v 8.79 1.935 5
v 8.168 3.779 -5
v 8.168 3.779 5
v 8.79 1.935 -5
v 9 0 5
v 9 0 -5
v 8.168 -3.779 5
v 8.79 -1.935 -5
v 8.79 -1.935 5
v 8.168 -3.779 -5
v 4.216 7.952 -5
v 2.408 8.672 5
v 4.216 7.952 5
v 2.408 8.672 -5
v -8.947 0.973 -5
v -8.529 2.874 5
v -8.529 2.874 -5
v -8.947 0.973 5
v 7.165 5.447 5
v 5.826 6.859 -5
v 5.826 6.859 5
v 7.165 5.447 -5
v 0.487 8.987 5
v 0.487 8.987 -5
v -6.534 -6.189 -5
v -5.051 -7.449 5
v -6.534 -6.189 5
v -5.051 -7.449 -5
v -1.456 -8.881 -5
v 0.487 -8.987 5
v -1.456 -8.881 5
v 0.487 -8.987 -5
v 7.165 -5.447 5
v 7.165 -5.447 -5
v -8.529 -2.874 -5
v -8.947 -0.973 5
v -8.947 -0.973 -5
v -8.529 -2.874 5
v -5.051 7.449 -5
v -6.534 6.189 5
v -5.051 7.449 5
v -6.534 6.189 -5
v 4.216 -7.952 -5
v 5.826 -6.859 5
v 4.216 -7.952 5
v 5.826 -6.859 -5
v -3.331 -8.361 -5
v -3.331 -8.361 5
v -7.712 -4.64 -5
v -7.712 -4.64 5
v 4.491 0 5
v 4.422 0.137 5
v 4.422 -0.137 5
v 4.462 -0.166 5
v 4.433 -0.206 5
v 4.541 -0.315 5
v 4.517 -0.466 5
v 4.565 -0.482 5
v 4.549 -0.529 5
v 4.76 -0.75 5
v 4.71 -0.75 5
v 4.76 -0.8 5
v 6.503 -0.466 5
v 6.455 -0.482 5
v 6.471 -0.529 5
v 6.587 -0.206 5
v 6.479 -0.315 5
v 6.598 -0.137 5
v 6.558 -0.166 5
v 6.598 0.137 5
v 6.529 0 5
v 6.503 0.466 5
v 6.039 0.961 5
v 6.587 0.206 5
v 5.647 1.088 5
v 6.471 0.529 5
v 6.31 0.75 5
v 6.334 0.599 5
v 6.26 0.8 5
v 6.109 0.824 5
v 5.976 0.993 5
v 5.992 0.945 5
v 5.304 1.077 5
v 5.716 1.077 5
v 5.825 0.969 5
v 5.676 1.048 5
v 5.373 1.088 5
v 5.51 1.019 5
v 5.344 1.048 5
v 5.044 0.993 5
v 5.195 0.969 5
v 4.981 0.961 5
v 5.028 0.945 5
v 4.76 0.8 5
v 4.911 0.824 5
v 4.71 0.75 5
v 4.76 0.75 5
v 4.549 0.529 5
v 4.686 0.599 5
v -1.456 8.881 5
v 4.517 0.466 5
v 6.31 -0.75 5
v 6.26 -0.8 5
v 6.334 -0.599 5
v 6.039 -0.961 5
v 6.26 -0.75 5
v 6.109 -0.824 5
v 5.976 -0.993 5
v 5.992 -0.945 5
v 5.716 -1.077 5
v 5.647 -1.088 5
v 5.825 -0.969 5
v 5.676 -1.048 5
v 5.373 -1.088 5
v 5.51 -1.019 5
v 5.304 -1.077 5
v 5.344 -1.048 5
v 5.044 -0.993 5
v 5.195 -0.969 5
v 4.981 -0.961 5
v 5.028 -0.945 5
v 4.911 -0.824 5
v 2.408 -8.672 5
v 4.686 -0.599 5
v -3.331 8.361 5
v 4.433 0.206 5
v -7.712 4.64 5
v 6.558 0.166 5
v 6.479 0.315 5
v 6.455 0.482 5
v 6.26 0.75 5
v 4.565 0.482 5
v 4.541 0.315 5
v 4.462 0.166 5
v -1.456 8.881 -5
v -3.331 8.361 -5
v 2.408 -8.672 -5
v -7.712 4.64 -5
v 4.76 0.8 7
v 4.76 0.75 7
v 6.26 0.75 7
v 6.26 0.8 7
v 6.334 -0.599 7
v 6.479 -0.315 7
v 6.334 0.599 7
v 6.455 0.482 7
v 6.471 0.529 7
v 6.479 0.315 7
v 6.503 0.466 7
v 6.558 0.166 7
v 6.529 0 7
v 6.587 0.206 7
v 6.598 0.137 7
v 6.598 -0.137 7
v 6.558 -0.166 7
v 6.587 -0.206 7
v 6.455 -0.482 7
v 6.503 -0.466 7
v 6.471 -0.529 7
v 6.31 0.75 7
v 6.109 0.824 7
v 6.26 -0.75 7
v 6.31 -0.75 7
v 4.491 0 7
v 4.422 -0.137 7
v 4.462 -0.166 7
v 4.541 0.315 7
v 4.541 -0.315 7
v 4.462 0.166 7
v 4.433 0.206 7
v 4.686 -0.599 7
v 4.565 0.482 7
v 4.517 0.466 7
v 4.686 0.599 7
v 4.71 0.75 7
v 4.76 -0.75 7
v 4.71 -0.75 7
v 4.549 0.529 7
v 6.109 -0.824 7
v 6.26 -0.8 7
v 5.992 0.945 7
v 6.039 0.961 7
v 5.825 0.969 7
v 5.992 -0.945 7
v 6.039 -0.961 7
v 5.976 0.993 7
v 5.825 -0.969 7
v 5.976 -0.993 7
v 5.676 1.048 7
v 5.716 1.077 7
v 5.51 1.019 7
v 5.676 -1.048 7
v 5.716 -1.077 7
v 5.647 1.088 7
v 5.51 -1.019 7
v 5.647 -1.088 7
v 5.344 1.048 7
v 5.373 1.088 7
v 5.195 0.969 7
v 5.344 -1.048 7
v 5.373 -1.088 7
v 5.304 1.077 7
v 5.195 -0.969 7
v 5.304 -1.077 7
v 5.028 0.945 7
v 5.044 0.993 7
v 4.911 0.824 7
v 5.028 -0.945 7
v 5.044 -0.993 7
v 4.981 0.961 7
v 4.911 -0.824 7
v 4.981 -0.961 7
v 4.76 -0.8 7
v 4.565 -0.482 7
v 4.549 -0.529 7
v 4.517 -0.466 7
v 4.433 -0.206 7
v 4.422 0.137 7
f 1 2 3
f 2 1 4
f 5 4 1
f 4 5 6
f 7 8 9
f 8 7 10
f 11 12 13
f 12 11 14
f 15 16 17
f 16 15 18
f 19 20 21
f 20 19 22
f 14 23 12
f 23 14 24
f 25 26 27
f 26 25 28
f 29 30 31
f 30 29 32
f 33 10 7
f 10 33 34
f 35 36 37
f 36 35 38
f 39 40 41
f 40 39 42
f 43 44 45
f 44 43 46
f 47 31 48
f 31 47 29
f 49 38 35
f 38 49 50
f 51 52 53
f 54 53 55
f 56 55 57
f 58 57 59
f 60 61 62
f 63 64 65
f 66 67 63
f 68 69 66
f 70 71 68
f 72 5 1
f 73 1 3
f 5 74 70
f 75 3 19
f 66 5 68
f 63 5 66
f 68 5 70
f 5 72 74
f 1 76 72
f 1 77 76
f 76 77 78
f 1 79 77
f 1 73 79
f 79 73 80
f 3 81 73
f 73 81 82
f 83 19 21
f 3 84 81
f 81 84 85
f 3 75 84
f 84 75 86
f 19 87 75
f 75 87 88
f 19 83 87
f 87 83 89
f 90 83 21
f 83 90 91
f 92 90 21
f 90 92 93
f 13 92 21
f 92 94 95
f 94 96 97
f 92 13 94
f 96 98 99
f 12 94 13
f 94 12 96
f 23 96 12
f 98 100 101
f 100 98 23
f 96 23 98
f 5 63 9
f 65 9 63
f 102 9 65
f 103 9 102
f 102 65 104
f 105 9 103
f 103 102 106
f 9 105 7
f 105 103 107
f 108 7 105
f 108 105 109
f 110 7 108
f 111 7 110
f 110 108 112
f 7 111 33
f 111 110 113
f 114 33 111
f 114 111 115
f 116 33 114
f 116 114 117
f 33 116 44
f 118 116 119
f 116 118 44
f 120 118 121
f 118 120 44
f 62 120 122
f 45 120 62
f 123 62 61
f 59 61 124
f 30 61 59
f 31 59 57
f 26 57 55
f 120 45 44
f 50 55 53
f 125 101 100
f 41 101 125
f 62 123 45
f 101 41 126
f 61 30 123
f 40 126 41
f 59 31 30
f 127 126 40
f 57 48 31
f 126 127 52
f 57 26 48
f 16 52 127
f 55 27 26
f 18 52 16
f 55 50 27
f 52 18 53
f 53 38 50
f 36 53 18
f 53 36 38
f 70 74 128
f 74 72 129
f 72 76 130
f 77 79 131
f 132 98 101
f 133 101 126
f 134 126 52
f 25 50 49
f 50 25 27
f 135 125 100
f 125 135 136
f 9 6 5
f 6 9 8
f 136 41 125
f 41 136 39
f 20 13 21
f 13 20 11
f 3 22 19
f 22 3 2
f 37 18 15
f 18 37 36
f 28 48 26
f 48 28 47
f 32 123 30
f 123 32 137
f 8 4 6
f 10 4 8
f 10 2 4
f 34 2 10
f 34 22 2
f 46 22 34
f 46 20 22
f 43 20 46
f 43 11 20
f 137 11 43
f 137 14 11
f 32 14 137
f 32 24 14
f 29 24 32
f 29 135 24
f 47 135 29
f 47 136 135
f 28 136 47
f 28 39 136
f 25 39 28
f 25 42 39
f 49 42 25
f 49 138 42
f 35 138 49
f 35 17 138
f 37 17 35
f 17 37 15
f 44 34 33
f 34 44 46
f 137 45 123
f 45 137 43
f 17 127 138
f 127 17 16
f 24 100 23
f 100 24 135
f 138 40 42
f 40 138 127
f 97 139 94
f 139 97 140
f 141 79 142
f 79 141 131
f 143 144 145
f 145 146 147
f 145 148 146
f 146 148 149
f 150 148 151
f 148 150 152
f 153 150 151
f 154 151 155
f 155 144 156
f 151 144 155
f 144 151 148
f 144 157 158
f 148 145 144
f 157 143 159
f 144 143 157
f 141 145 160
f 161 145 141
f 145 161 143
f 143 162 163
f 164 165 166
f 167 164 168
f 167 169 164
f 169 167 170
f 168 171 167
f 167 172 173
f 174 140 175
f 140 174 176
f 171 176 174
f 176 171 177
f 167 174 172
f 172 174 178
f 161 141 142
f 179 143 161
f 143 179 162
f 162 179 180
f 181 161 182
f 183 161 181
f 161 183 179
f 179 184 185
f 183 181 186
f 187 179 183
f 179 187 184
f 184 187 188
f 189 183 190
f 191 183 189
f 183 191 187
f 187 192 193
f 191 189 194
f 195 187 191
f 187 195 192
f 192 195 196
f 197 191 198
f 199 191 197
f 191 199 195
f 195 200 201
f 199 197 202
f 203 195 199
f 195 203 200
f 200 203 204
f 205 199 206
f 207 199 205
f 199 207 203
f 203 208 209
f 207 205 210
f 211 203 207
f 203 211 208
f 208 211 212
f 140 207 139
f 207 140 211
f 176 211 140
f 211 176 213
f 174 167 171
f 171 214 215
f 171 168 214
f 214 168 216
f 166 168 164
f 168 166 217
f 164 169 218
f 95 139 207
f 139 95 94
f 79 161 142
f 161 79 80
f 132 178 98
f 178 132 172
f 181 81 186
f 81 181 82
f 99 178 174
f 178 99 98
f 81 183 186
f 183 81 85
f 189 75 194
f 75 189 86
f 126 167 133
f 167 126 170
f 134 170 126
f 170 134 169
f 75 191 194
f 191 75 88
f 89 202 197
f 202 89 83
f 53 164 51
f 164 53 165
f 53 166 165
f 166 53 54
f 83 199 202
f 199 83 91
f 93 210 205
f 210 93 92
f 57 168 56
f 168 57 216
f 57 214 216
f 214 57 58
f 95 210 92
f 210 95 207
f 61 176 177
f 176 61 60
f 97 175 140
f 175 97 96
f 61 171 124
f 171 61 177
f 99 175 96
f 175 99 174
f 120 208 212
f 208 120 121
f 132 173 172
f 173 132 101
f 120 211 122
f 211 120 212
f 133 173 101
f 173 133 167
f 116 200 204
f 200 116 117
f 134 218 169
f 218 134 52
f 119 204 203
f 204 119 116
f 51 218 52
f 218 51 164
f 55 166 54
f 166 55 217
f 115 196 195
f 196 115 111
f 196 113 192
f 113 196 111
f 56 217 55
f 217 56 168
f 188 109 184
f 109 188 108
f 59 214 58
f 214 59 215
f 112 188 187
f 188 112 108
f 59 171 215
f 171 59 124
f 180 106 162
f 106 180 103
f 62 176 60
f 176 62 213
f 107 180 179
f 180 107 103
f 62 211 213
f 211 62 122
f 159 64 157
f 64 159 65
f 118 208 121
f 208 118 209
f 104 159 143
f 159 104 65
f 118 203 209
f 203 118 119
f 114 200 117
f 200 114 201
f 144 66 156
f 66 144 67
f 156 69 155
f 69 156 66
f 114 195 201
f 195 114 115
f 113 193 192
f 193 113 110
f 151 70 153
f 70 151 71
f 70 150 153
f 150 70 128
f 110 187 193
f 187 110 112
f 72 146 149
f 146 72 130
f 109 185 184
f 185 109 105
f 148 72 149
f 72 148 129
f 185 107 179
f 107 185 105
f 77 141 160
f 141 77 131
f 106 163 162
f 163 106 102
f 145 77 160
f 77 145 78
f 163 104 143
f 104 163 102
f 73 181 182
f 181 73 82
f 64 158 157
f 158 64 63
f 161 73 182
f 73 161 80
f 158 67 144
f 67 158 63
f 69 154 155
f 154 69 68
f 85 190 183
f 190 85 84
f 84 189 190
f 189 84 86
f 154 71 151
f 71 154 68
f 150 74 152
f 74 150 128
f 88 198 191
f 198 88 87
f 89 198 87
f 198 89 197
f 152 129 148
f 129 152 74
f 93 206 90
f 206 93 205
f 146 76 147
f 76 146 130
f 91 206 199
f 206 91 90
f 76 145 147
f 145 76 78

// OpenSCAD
// Parameters
tooth_count = 20; //[10:60:1]
pitch_diameter_mm = 12.22; //[6.11:24.44:0.01]
pitch_radius_mm = 6.11; //[3.055:12.22:0.01]
belt_pitch_mm = 2; //[1:10:0.01]
pulley_width_mm = 7; //[4:20:0.1]
tooth_depth_mm = 0.8; //[0.4:1.6:0.01]
tooth_width_mm = 1.5; //[0.8:3:0.01]
tooth_profile_scale = 1; //[0.8:1.2:0.01]
tooth_root_radius_offset_mm = 0.6; //[0.2:1.5:0.01]
tooth_outer_radius_offset_mm = 0.9; //[0.3:2:0.01]
hub_diameter_mm = 18; //[10:36:0.1]
hub_length_mm = 10; //[5:25:0.1]
bore_diameter_mm = 5; //[2:12:0.01]
flange_outer_diameter_mm = 16; //[10:30:0.1]
flange_thickness_mm = 1.5; //[0.8:4:0.1]
flanges_enabled = 1; //[0:1:1]
set_screw_count = 1; //[0:2:1]
set_screw_hole_diameter_mm = 3; //[1.5:6:0.1]
set_screw_z_offset_mm = 0; //[-5:5:0.1]
set_screw_radial_inset_mm = 1; //[0.5:3:0.1]
d_flat_enabled = 0; //[0:1:1]
d_flat_depth_mm = 0.6; //[0.2:2:0.01]
keyway_enabled = 0; //[0:1:1]
keyway_width_mm = 2; //[1:5:0.1]
keyway_depth_mm = 1; //[0.5:3:0.1]
tolerance_mm = 0.2; //[0.05:0.6:0.01]
overlap_mm = 1; //[0.5:2:0.1]

// Pulley - complete geometry
module pulley() {
  color("Silver") {
    // Toothed Rim
    difference() {
      cylinder(r=pitch_radius_mm + tooth_outer_radius_offset_mm, h=pulley_width_mm, center=true);
      cylinder(r=pitch_radius_mm - tooth_root_radius_offset_mm, h=pulley_width_mm + 2*overlap_mm, center=true);
    }
    // Hub
    translate([0, 0, 0])
      cylinder(r=hub_diameter_mm/2, h=hub_length_mm, center=true);
    // Flanges
    if (flanges_enabled) {
      translate([0, 0, pulley_width_mm/2 + flange_thickness_mm/2 - overlap_mm])
        cylinder(r=flange_outer_diameter_mm/2, h=flange_thickness_mm, center=true);
      translate([0, 0, -pulley_width_mm/2 - flange_thickness_mm/2 + overlap_mm])
        cylinder(r=flange_outer_diameter_mm/2, h=flange_thickness_mm, center=true);
    }
  }
}

// Printed Pulley Teeth From Profile
module printed_pulley_teeth_from_profile() {
  scale([tooth_profile_scale, tooth_profile_scale, 1]) {
    translate([pitch_radius_mm + tooth_depth_mm/2 - overlap_mm, 0, 0]) {
      for (i = [0:tooth_count-1]) {
        rotate([0, 0, i*360/tooth_count]) {
          linear_extrude(height=pulley_width_mm) {
            polygon(points=[
              [-tooth_width_mm/2, 0],
              [-tooth_width_mm/2, tooth_depth_mm],
              [0, tooth_depth_mm*1.15],
              [tooth_width_mm/2, tooth_depth_mm],
              [tooth_width_mm/2, 0]
            ]);
          }
        }
      }
    }
  }
}

// Printed Pulley GT2 Teeth
module printed_pulley_GT2_teeth() {
  printed_pulley_teeth_from_profile();
}

// Printed Pulley Teeth
module printed_pulley_teeth() {
  printed_pulley_teeth_from_profile();
}

// Assembly
module assembly() {
  pulley();
  printed_pulley_teeth();
}

assembly();
